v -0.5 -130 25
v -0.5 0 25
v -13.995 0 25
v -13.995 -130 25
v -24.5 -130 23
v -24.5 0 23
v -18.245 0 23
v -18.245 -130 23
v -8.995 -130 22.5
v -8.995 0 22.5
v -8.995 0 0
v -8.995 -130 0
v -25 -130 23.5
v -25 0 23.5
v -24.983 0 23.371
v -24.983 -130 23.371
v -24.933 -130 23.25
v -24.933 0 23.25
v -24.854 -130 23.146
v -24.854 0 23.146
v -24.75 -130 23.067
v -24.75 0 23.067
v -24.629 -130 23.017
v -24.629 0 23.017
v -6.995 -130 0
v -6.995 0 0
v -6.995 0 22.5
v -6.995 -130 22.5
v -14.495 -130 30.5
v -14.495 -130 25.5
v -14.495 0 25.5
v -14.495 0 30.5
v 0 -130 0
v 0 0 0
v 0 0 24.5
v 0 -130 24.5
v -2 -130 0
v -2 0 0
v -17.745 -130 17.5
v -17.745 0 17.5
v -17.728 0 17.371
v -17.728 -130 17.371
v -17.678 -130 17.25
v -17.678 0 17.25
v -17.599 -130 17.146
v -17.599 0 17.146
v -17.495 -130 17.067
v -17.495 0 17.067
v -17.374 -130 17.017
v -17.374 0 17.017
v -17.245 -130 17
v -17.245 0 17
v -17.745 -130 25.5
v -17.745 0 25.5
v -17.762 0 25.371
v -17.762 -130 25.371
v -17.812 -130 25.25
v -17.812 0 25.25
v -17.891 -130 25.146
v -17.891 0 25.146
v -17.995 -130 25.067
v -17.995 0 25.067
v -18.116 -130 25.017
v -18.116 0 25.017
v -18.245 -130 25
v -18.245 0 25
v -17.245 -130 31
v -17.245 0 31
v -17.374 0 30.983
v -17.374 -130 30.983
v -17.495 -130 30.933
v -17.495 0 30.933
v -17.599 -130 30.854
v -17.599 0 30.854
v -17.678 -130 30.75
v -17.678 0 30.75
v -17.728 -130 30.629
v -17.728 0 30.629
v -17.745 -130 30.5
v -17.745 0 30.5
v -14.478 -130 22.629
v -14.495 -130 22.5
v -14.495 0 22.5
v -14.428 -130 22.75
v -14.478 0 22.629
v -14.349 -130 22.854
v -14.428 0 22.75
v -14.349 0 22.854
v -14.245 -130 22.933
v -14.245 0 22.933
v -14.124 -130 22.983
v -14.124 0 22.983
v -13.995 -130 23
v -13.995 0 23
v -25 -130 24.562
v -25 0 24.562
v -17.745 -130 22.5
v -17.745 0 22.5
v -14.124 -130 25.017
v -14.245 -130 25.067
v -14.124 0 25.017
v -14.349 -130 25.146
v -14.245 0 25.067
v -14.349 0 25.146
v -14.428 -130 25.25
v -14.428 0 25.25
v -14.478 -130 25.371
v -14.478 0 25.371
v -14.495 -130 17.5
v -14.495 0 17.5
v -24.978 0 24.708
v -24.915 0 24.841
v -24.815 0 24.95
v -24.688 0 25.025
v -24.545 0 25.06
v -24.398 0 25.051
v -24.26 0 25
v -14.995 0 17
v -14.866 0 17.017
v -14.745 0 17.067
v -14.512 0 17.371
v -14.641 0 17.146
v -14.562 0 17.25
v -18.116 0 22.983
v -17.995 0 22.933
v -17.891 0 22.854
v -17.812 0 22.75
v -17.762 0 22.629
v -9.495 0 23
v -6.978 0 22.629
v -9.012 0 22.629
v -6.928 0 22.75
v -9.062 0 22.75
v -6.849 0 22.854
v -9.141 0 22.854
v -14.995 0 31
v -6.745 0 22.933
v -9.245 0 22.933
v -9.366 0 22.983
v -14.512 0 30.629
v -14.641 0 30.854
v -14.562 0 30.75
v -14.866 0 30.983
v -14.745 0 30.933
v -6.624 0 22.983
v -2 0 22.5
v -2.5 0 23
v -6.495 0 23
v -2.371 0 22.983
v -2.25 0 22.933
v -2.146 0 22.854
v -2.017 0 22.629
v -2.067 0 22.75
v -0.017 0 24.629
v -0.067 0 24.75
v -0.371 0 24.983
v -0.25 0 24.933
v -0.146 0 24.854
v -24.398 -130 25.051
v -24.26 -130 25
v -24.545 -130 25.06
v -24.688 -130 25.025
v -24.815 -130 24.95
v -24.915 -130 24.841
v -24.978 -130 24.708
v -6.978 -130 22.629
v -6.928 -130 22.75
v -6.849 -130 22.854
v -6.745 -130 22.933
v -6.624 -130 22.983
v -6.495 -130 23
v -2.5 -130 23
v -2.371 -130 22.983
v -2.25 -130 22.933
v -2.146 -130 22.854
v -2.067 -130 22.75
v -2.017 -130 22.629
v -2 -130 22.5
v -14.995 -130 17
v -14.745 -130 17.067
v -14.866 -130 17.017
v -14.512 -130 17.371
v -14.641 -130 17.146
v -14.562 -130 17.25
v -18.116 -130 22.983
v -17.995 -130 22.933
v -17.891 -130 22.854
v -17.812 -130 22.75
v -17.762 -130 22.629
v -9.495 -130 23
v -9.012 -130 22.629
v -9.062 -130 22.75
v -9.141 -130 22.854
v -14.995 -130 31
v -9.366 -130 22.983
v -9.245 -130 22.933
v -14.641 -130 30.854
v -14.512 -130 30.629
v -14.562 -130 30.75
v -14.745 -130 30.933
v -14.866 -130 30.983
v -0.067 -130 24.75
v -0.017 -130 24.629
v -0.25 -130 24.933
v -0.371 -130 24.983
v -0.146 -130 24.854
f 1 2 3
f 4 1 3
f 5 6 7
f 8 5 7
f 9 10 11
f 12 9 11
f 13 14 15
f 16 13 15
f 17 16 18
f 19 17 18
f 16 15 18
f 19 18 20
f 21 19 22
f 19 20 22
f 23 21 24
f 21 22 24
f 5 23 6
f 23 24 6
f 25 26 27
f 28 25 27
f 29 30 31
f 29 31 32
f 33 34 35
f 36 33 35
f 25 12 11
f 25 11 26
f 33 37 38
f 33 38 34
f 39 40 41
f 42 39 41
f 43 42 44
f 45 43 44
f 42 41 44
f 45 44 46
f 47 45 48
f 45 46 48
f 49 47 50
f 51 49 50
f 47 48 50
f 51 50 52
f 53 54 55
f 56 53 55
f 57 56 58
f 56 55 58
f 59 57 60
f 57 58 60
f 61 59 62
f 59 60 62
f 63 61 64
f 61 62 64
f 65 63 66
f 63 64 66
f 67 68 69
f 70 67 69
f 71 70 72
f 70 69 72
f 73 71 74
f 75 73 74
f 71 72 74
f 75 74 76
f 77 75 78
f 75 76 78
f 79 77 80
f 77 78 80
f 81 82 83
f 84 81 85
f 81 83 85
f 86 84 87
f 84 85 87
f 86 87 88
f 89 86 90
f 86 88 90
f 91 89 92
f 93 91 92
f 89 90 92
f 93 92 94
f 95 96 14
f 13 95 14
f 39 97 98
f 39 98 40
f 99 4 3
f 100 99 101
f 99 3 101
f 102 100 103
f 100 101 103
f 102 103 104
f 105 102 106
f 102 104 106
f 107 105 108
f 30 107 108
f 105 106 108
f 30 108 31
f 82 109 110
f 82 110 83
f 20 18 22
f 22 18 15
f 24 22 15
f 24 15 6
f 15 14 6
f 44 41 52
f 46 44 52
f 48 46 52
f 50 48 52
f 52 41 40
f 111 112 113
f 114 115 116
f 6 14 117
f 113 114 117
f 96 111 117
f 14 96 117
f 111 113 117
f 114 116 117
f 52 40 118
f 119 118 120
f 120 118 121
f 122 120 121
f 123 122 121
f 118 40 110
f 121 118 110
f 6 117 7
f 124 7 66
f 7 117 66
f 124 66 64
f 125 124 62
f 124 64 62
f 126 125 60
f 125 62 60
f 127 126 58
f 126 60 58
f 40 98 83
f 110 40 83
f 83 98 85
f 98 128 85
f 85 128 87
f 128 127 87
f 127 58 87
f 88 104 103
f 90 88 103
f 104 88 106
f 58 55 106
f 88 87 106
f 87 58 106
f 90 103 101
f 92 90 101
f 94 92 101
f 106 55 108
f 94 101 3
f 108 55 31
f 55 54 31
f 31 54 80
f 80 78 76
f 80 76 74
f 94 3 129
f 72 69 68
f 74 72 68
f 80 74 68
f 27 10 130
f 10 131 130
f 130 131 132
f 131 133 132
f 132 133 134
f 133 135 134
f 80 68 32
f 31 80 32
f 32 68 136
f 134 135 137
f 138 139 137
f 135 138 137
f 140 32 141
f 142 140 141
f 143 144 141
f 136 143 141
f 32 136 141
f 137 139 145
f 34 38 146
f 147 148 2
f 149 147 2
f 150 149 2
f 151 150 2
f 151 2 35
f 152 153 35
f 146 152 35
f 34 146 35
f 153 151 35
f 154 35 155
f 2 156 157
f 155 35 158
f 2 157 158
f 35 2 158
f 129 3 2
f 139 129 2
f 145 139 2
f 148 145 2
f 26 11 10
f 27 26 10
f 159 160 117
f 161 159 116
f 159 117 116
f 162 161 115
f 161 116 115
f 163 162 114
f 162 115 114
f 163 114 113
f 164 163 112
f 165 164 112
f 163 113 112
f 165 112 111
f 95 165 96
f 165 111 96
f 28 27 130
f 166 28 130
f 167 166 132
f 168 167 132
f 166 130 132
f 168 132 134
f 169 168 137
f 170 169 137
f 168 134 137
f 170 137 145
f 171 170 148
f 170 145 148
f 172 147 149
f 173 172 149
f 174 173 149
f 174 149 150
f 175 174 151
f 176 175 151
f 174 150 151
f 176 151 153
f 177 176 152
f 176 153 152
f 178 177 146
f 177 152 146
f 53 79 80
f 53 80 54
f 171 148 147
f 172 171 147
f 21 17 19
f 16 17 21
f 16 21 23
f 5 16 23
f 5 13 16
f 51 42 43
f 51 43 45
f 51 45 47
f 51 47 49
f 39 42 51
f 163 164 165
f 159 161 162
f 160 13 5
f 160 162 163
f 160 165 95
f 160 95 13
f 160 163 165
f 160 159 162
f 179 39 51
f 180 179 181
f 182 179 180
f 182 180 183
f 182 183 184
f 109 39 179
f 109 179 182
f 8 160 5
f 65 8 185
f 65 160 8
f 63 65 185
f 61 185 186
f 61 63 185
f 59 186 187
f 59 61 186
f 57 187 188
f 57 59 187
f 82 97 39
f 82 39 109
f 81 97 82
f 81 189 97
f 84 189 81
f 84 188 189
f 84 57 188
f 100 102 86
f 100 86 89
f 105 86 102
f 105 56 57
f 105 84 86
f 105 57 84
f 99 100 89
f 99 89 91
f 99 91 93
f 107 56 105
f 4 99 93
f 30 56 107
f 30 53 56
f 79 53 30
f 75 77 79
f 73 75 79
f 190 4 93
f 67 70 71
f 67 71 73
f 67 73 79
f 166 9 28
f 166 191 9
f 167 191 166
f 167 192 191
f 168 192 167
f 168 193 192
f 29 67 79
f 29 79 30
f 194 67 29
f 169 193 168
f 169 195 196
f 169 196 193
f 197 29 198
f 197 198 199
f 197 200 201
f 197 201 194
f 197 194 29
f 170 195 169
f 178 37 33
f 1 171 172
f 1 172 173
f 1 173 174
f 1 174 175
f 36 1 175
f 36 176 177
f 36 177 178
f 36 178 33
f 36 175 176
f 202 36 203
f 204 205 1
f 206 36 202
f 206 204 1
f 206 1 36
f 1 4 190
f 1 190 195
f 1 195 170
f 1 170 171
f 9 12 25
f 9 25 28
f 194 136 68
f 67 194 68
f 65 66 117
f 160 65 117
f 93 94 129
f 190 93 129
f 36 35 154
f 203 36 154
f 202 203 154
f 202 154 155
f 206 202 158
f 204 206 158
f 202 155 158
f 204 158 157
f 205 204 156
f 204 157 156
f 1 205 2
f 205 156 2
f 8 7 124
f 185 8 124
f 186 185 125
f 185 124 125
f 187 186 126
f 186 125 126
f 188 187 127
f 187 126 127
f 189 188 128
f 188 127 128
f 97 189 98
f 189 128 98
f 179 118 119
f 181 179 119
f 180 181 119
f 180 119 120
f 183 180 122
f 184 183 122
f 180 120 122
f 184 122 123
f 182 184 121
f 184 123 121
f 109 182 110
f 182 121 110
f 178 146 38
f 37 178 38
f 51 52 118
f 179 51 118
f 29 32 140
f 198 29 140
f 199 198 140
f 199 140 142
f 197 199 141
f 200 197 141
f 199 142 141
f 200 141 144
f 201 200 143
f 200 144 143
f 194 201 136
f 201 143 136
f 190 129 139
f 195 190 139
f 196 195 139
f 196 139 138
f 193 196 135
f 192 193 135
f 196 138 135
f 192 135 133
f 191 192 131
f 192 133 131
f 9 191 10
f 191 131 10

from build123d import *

# Parameters (mm, degrees)
F1_DEPTH = 130


with BuildPart() as f1:
    # F0 (on Front) → F1 (new body)
    with BuildSketch(Plane.XZ):
        with BuildLine():
            Line((-2, 0), (0, 0))
            Line((0, 0), (0, 24.5))
            ThreePointArc((0, 24.5), (-0.146447, 24.853553), (-0.5, 25))
            Line((-0.5, 25), (-13.995, 25))
            ThreePointArc((-13.995, 25), (-14.348553, 25.146447), (-14.495, 25.5))
            Line((-14.495, 25.5), (-14.495, 30.5))
            ThreePointArc((-14.495, 30.5), (-14.641447, 30.853553), (-14.995, 31))
            Line((-14.995, 31), (-17.245, 31))
            ThreePointArc((-17.245, 31), (-17.598553, 30.853553), (-17.745, 30.5))
            Line((-17.745, 30.5), (-17.745, 25.5))
            ThreePointArc((-17.745, 25.5), (-17.891447, 25.146447), (-18.245, 25))
            Line((-18.245, 25), (-24.25953, 25))
            ThreePointArc((-24.25953, 25), (-24.754721, 24.991876), (-25, 24.561623))
            Line((-25, 24.561623), (-25, 23.5))
            ThreePointArc((-25, 23.5), (-24.853553, 23.146447), (-24.5, 23))
            Line((-24.5, 23), (-18.245, 23))
            ThreePointArc((-18.245, 23), (-17.891447, 22.853553), (-17.745, 22.5))
            Line((-17.745, 22.5), (-17.745, 17.5))
            ThreePointArc((-17.745, 17.5), (-17.598553, 17.146447), (-17.245, 17))
            Line((-17.245, 17), (-14.995, 17))
            ThreePointArc((-14.995, 17), (-14.641447, 17.146447), (-14.495, 17.5))
            Line((-14.495, 17.5), (-14.495, 22.5))
            ThreePointArc((-14.495, 22.5), (-14.348553, 22.853553), (-13.995, 23))
            Line((-13.995, 23), (-9.495, 23))
            ThreePointArc((-9.495, 23), (-9.141447, 22.853553), (-8.995, 22.5))
            Line((-8.995, 22.5), (-8.995, 0))
            Line((-8.995, 0), (-6.995, 0))
            Line((-6.995, 0), (-6.995, 22.5))
            ThreePointArc((-6.995, 22.5), (-6.848553, 22.853553), (-6.495, 23))
            Line((-6.495, 23), (-2.5, 23))
            ThreePointArc((-2.5, 23), (-2.146447, 22.853553), (-2, 22.5))
            Line((-2, 22.5), (-2, 0))
        make_face()
    extrude(amount=F1_DEPTH)


solid = f1.part
